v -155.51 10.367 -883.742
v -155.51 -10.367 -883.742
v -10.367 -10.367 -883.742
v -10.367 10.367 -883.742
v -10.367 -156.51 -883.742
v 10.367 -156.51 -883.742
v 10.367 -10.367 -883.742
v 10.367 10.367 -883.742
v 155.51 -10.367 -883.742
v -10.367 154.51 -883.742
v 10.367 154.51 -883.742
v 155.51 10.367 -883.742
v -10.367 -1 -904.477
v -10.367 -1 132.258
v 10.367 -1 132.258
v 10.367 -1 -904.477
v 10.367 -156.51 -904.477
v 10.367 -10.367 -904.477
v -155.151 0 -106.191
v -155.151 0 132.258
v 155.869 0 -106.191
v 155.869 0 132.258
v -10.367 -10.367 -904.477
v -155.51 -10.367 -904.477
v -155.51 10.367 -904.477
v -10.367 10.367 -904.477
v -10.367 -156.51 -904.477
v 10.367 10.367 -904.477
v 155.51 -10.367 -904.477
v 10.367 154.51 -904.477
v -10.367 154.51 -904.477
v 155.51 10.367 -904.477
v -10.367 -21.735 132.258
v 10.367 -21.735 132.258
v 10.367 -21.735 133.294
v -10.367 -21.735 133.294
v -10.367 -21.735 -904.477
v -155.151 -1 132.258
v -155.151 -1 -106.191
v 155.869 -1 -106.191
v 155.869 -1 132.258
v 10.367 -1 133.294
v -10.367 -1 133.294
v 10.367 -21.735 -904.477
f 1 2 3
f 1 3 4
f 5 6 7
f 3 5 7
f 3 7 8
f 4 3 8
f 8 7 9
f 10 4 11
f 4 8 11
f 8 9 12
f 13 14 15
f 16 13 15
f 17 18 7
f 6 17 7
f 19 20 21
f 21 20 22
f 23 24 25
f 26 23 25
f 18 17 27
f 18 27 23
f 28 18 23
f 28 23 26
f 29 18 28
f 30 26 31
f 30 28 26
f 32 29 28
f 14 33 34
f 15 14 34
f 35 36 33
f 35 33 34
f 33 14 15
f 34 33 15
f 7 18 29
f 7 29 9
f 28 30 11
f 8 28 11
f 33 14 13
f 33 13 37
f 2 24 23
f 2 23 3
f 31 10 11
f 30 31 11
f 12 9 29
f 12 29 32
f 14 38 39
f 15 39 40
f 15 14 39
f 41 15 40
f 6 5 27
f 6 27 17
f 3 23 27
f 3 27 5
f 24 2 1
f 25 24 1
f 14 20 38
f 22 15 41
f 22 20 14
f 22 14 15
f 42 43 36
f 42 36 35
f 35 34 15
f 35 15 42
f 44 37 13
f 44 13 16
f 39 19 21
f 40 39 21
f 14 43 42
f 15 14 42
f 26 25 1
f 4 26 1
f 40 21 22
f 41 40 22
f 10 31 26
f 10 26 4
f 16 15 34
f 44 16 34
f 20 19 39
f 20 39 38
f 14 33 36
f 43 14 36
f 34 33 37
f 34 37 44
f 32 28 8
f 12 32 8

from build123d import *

# Parameters (mm, degrees)
F0_W     = 311.0204081633
F0_H     = 238.4489795918
F1_DEPTH = 1
F2_W     = 20.7346938776
F2_H     = 1.0367346939
F3_DEPTH = 20.7346938776
F5_W     = 20.7346938776
F5_H     = 20.7346938776
F6_DEPTH = 155.5102040816
F7_W     = 20.7346938776
F7_H     = 20.7346938776
F8_DEPTH = 155.5102040816
F4_W     = 20.7346938776
F4_H     = 20.7346938776
F9_DEPTH = 1036.7346938776


# Not quite as in the source:
# - the program builds the solid bodies; features that only make, move or delete a surface that nothing else refers to are left out


with BuildPart() as f1:
    # F0 (on Front) → F1 (new body)
    with BuildSketch(Plane.XZ):
        with Locations((0.3589130938, 13.0331495404)):
            Rectangle(F0_W, F0_H)
    extrude(amount=F1_DEPTH)

    # F2 (on face) → F3 (join)
    with BuildSketch(Plane.XZ.offset(1)):
        with Locations((0, 132.7760066833)):
            Rectangle(F2_W, F2_H)
    extrude(amount=F3_DEPTH)


with BuildPart() as f6:
    # F5 (on face) → F6 (new body, symmetric)
    with BuildSketch(Plane.XZ.offset(1)):
        with Locations((0, -894.1097076024)):
            Rectangle(F5_W, F5_H)
    extrude(amount=F6_DEPTH, both=True)

    # F7 (on Right) → F8 (join, symmetric)
    with BuildSketch(Plane.YZ):
        with Locations((0, -894.1097076024)):
            Rectangle(F7_W, F7_H)
    extrude(amount=F8_DEPTH, both=True)


with BuildPart() as f9:
    # F4 (on face) → F9 (new body)
    with BuildSketch(Plane(origin=(0, 0, 132.2576393363), x_dir=(1, 0, 0), z_dir=(0, 0, -1))):
        with Locations((0, 11.3673469388)):
            Rectangle(F4_W, F4_H)
    extrude(amount=F9_DEPTH)


solid = Compound([f1.part, f6.part, f9.part])
